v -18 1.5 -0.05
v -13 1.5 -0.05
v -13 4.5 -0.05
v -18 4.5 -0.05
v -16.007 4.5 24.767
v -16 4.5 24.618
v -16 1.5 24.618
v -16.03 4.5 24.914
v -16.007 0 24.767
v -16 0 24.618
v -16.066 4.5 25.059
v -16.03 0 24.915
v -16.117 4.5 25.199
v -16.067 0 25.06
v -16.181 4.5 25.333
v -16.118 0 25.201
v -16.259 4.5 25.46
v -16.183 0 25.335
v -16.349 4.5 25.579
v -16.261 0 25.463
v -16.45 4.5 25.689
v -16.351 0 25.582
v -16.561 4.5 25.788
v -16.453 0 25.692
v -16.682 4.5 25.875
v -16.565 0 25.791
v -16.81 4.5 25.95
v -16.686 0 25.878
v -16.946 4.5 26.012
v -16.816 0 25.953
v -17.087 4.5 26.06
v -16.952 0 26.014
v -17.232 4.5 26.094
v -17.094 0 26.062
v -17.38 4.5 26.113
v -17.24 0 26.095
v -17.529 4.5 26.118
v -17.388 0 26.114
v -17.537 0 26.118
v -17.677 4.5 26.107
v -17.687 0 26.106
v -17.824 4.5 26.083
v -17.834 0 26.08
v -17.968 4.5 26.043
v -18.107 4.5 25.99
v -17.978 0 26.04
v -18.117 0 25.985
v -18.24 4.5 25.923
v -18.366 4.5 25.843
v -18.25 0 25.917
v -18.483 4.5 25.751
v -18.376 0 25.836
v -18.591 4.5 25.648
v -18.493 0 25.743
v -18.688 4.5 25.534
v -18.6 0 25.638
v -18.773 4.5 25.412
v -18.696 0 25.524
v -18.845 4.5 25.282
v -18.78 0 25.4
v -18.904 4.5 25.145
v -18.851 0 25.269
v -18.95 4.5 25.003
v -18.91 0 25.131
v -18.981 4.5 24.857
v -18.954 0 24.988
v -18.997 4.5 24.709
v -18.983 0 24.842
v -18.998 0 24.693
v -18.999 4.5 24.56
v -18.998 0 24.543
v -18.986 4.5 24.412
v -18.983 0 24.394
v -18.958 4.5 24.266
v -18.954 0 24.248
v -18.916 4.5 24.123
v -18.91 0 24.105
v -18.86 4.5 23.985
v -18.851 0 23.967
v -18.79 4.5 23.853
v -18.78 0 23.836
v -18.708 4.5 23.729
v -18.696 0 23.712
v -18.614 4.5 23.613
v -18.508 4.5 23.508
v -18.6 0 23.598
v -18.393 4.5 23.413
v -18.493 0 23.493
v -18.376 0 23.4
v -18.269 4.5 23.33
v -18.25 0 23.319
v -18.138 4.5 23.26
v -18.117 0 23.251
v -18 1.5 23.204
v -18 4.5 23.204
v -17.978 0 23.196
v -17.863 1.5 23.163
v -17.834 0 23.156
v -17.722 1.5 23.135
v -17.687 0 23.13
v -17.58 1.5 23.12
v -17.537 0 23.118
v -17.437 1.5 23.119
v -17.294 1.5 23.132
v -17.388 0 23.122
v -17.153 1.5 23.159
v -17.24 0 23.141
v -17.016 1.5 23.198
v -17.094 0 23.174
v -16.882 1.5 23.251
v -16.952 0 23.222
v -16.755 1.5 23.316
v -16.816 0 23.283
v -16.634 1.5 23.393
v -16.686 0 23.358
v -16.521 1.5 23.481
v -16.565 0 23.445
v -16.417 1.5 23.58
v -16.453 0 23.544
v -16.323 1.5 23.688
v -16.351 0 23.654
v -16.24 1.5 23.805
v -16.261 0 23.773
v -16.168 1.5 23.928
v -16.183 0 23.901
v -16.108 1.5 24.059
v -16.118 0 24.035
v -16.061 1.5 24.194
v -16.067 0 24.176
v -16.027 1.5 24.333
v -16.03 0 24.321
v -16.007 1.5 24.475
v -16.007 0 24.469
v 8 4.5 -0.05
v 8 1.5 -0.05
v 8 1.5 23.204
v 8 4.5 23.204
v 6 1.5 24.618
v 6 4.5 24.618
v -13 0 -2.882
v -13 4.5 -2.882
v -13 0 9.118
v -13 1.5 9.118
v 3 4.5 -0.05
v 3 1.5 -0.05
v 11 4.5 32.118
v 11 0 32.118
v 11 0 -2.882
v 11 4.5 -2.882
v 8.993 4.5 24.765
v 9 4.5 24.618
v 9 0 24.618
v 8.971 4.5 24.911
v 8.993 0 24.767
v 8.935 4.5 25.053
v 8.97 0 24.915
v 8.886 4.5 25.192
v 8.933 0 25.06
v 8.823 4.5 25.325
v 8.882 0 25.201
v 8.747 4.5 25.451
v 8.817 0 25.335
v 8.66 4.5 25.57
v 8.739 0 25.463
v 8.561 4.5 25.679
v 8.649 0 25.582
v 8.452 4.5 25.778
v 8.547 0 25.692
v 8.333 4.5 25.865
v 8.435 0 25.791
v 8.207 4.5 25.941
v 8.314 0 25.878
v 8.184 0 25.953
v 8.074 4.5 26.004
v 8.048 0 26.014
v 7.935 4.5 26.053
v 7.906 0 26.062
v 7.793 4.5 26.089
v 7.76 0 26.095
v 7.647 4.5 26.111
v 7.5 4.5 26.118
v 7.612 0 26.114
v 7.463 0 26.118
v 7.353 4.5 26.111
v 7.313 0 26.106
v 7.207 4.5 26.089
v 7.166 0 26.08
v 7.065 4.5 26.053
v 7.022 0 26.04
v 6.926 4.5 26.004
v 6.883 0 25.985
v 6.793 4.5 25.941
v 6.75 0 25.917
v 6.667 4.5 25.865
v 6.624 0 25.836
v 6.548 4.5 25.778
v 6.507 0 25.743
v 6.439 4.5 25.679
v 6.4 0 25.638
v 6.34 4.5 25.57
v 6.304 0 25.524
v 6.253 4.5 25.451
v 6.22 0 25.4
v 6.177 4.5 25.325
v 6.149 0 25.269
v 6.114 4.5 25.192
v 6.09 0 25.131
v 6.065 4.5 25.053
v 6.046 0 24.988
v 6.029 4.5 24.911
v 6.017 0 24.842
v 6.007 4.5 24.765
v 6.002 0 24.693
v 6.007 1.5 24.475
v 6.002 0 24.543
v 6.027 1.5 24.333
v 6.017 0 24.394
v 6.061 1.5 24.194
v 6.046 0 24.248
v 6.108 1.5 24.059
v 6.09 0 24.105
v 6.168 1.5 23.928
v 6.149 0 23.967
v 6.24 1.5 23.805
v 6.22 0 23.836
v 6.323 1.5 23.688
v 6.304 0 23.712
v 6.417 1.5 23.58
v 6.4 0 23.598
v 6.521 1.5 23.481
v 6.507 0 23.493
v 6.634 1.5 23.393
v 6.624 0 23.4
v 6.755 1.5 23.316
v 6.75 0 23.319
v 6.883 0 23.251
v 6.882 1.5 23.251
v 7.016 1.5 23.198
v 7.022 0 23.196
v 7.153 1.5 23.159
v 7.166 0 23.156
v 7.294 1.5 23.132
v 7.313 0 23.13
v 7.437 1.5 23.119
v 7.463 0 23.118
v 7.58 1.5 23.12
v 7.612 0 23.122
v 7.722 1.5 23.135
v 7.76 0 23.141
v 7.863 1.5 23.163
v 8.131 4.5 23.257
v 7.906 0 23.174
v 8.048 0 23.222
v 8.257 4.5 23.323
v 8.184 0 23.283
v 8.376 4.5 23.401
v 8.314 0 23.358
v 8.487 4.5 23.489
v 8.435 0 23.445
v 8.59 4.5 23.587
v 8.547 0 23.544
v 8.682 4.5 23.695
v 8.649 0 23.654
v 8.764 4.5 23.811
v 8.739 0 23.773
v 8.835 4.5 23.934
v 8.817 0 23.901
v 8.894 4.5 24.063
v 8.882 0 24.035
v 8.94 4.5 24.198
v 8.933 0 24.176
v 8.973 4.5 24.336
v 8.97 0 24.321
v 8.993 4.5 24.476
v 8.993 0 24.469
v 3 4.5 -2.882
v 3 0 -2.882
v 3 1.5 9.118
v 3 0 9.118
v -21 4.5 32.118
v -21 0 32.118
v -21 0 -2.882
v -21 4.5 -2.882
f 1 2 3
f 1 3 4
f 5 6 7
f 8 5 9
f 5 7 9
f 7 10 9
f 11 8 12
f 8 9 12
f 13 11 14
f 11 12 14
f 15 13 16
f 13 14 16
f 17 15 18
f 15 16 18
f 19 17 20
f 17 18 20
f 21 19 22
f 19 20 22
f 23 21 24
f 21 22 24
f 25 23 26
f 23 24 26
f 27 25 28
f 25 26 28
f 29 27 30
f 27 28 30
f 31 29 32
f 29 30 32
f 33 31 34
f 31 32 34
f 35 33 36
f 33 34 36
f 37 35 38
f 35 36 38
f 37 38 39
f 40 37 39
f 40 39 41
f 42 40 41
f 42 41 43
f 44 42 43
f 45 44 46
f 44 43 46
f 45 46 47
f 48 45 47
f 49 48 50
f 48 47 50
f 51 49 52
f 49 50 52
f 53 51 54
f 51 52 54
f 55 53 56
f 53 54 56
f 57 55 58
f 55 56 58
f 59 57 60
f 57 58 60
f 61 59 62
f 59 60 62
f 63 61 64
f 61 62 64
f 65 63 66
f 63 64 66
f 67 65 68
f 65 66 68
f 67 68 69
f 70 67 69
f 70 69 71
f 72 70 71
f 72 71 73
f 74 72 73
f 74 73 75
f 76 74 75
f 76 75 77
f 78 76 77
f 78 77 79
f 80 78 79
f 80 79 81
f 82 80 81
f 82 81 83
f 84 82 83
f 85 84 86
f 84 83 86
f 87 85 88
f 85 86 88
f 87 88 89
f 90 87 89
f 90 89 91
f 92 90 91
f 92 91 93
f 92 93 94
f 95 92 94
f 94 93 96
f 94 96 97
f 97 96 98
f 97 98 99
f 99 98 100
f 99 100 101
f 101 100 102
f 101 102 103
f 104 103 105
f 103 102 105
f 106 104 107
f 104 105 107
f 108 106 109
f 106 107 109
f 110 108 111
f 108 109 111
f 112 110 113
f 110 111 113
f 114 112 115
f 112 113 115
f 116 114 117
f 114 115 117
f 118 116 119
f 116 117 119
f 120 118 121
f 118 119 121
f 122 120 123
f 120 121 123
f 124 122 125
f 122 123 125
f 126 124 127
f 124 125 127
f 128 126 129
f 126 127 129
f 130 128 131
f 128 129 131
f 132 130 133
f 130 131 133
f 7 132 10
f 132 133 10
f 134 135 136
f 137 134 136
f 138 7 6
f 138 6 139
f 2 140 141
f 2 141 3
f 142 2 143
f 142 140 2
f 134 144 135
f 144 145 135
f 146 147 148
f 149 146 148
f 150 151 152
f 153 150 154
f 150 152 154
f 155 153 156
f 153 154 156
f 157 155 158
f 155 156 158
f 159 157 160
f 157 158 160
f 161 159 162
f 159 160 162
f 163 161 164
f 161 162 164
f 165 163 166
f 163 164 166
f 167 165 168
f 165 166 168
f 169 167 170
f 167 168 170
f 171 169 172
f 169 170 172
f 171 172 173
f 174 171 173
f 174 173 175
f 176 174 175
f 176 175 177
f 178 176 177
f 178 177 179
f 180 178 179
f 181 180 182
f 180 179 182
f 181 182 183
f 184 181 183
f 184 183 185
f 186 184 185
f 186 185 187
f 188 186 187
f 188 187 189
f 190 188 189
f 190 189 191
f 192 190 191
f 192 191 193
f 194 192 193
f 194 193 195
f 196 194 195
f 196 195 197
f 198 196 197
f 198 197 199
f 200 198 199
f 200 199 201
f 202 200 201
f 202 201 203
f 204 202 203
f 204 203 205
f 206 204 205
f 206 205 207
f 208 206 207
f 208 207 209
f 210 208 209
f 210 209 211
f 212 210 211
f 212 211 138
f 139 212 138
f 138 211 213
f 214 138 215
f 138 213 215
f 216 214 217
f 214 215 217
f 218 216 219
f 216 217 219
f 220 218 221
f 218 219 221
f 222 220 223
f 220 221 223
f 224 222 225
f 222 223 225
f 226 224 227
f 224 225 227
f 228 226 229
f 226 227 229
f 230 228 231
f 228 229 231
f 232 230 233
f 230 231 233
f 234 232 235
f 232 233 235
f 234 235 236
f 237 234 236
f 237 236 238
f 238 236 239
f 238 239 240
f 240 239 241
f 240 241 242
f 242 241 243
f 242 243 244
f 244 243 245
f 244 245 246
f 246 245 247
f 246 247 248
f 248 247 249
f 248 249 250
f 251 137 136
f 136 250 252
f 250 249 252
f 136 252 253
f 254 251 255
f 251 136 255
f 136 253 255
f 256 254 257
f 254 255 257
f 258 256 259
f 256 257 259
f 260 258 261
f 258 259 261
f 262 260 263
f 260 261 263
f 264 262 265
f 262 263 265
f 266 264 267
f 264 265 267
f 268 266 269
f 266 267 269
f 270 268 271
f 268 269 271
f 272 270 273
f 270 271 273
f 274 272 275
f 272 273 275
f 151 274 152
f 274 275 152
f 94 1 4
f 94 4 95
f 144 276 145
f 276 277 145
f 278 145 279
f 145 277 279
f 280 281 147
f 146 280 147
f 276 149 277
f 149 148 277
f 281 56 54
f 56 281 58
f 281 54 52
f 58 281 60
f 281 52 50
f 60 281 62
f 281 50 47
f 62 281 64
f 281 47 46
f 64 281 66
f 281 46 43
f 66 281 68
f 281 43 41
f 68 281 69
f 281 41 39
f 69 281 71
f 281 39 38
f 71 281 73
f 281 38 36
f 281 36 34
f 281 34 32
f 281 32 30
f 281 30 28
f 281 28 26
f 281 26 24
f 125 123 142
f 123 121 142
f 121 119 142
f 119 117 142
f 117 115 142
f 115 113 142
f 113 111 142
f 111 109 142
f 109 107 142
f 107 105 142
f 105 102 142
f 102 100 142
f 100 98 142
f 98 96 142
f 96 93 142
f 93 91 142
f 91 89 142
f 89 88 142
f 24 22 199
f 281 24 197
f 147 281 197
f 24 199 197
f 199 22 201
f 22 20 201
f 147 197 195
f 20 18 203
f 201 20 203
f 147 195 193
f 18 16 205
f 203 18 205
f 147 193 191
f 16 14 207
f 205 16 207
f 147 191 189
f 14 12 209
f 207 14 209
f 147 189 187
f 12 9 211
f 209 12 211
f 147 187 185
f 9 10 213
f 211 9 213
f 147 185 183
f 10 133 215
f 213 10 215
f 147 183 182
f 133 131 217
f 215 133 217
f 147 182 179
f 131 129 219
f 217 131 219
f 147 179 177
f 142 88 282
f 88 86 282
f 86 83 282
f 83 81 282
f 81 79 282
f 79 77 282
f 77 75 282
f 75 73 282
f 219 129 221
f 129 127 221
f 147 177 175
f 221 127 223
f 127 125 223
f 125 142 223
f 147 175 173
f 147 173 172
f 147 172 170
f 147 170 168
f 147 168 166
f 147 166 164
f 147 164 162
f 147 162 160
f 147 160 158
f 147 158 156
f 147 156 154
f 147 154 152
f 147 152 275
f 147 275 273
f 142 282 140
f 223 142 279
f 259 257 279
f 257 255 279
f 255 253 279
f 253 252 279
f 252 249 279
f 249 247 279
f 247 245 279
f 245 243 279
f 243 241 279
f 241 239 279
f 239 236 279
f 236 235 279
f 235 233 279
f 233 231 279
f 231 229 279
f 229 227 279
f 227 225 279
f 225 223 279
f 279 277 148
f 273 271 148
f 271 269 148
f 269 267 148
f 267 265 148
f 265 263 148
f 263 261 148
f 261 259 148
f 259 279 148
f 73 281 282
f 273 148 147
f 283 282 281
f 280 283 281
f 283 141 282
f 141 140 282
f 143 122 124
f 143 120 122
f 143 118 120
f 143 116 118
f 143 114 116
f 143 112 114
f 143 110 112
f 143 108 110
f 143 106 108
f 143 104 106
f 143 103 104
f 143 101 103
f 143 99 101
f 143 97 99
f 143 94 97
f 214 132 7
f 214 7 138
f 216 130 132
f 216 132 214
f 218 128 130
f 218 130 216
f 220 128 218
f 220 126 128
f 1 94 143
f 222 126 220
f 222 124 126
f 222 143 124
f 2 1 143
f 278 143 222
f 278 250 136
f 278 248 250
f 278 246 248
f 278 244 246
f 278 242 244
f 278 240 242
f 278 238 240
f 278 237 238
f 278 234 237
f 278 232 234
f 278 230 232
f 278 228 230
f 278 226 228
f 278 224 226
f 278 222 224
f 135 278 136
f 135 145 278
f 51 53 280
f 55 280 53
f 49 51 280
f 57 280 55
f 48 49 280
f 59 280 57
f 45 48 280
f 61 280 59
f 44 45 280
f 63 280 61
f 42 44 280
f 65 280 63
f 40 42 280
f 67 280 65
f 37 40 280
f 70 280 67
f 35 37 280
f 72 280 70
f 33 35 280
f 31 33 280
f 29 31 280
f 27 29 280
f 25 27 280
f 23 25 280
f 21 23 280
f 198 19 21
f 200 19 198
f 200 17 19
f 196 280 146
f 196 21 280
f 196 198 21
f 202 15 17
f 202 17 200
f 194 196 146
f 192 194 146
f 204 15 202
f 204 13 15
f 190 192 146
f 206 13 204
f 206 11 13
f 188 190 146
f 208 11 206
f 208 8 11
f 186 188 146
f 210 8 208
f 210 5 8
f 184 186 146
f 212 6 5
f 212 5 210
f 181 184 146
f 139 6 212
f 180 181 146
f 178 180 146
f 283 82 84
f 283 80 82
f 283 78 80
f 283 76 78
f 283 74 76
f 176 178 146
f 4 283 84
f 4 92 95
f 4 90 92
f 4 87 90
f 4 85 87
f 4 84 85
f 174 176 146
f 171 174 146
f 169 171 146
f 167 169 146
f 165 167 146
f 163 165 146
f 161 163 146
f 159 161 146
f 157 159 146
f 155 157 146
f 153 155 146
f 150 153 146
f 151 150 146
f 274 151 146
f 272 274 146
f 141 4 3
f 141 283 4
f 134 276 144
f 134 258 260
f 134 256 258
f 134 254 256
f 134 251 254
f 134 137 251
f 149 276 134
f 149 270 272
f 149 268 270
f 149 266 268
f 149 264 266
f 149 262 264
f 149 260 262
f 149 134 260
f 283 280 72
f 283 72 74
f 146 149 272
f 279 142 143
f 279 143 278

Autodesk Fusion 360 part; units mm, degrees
sketch "Sketch3" plane through (0, 0, 0) normal (0, 1, 0) x (1, 0, 0)
  line L0 (11, 2.882) -> (-21, 2.882)
  line L1 (-21, 2.882) -> (-21, -32.118)
  line L2 (-21, -32.118) -> (11, -32.118)
  line L3 (11, -32.118) -> (11, 2.882)
  line L4 (-5, -24.618) -> (-5, 2.882)
  circle A0 centre (-17.5, -24.618) radius 1.5
  circle A1 centre (7.5, -24.618) radius 1.5
  line L5 (-17.5, -24.618) -> (7.5, -24.618)
  line L6 (-5, 0.0503) -> (-18, 0.0503)
  line L7 (-5, 0.0503) -> (8, 0.0503)
  line L8 (-18, 0.0503) -> (-18, -23.2038)
  line L9 (8, 0.0503) -> (8, -23.2038)
  line L10 (-5, 2.882) -> (-13, 2.882)
  line L11 (-5, 2.882) -> (3, 2.882)
  line L12 (-13, 2.882) -> (-13, -9.118)
  line L13 (3, 2.882) -> (3, -9.118)
  line L14 (-13, -9.118) -> (3, -9.118)
  dimension "d32" = 35
  dimension "d33" = 32
  dimension "d58" = 27.5
  dimension "d61" = 3
  dimension "d62" = 3
  dimension "d63" = 13
  dimension "d64" = 13
  dimension "d66" = 8
  dimension "d67" = 8
  dimension "d68" = 12
  dimension "d69" = 12
  dimension "d70" = 16
  dimension "d71" = 23.2541
extrude "Extrude7" add sketch "Sketch3" along normal blind 4.5 contours L0 L1 L2 L3 A0 A1 L5 L6 L7 L8 L9 L12 L13
extrude "Extrude8" add sketch "Sketch3" along normal blind 1.5 contours L4 A1 L5 L7 L9 L13 L14 | L4 A0 L5 L6 L8 L12 L14
